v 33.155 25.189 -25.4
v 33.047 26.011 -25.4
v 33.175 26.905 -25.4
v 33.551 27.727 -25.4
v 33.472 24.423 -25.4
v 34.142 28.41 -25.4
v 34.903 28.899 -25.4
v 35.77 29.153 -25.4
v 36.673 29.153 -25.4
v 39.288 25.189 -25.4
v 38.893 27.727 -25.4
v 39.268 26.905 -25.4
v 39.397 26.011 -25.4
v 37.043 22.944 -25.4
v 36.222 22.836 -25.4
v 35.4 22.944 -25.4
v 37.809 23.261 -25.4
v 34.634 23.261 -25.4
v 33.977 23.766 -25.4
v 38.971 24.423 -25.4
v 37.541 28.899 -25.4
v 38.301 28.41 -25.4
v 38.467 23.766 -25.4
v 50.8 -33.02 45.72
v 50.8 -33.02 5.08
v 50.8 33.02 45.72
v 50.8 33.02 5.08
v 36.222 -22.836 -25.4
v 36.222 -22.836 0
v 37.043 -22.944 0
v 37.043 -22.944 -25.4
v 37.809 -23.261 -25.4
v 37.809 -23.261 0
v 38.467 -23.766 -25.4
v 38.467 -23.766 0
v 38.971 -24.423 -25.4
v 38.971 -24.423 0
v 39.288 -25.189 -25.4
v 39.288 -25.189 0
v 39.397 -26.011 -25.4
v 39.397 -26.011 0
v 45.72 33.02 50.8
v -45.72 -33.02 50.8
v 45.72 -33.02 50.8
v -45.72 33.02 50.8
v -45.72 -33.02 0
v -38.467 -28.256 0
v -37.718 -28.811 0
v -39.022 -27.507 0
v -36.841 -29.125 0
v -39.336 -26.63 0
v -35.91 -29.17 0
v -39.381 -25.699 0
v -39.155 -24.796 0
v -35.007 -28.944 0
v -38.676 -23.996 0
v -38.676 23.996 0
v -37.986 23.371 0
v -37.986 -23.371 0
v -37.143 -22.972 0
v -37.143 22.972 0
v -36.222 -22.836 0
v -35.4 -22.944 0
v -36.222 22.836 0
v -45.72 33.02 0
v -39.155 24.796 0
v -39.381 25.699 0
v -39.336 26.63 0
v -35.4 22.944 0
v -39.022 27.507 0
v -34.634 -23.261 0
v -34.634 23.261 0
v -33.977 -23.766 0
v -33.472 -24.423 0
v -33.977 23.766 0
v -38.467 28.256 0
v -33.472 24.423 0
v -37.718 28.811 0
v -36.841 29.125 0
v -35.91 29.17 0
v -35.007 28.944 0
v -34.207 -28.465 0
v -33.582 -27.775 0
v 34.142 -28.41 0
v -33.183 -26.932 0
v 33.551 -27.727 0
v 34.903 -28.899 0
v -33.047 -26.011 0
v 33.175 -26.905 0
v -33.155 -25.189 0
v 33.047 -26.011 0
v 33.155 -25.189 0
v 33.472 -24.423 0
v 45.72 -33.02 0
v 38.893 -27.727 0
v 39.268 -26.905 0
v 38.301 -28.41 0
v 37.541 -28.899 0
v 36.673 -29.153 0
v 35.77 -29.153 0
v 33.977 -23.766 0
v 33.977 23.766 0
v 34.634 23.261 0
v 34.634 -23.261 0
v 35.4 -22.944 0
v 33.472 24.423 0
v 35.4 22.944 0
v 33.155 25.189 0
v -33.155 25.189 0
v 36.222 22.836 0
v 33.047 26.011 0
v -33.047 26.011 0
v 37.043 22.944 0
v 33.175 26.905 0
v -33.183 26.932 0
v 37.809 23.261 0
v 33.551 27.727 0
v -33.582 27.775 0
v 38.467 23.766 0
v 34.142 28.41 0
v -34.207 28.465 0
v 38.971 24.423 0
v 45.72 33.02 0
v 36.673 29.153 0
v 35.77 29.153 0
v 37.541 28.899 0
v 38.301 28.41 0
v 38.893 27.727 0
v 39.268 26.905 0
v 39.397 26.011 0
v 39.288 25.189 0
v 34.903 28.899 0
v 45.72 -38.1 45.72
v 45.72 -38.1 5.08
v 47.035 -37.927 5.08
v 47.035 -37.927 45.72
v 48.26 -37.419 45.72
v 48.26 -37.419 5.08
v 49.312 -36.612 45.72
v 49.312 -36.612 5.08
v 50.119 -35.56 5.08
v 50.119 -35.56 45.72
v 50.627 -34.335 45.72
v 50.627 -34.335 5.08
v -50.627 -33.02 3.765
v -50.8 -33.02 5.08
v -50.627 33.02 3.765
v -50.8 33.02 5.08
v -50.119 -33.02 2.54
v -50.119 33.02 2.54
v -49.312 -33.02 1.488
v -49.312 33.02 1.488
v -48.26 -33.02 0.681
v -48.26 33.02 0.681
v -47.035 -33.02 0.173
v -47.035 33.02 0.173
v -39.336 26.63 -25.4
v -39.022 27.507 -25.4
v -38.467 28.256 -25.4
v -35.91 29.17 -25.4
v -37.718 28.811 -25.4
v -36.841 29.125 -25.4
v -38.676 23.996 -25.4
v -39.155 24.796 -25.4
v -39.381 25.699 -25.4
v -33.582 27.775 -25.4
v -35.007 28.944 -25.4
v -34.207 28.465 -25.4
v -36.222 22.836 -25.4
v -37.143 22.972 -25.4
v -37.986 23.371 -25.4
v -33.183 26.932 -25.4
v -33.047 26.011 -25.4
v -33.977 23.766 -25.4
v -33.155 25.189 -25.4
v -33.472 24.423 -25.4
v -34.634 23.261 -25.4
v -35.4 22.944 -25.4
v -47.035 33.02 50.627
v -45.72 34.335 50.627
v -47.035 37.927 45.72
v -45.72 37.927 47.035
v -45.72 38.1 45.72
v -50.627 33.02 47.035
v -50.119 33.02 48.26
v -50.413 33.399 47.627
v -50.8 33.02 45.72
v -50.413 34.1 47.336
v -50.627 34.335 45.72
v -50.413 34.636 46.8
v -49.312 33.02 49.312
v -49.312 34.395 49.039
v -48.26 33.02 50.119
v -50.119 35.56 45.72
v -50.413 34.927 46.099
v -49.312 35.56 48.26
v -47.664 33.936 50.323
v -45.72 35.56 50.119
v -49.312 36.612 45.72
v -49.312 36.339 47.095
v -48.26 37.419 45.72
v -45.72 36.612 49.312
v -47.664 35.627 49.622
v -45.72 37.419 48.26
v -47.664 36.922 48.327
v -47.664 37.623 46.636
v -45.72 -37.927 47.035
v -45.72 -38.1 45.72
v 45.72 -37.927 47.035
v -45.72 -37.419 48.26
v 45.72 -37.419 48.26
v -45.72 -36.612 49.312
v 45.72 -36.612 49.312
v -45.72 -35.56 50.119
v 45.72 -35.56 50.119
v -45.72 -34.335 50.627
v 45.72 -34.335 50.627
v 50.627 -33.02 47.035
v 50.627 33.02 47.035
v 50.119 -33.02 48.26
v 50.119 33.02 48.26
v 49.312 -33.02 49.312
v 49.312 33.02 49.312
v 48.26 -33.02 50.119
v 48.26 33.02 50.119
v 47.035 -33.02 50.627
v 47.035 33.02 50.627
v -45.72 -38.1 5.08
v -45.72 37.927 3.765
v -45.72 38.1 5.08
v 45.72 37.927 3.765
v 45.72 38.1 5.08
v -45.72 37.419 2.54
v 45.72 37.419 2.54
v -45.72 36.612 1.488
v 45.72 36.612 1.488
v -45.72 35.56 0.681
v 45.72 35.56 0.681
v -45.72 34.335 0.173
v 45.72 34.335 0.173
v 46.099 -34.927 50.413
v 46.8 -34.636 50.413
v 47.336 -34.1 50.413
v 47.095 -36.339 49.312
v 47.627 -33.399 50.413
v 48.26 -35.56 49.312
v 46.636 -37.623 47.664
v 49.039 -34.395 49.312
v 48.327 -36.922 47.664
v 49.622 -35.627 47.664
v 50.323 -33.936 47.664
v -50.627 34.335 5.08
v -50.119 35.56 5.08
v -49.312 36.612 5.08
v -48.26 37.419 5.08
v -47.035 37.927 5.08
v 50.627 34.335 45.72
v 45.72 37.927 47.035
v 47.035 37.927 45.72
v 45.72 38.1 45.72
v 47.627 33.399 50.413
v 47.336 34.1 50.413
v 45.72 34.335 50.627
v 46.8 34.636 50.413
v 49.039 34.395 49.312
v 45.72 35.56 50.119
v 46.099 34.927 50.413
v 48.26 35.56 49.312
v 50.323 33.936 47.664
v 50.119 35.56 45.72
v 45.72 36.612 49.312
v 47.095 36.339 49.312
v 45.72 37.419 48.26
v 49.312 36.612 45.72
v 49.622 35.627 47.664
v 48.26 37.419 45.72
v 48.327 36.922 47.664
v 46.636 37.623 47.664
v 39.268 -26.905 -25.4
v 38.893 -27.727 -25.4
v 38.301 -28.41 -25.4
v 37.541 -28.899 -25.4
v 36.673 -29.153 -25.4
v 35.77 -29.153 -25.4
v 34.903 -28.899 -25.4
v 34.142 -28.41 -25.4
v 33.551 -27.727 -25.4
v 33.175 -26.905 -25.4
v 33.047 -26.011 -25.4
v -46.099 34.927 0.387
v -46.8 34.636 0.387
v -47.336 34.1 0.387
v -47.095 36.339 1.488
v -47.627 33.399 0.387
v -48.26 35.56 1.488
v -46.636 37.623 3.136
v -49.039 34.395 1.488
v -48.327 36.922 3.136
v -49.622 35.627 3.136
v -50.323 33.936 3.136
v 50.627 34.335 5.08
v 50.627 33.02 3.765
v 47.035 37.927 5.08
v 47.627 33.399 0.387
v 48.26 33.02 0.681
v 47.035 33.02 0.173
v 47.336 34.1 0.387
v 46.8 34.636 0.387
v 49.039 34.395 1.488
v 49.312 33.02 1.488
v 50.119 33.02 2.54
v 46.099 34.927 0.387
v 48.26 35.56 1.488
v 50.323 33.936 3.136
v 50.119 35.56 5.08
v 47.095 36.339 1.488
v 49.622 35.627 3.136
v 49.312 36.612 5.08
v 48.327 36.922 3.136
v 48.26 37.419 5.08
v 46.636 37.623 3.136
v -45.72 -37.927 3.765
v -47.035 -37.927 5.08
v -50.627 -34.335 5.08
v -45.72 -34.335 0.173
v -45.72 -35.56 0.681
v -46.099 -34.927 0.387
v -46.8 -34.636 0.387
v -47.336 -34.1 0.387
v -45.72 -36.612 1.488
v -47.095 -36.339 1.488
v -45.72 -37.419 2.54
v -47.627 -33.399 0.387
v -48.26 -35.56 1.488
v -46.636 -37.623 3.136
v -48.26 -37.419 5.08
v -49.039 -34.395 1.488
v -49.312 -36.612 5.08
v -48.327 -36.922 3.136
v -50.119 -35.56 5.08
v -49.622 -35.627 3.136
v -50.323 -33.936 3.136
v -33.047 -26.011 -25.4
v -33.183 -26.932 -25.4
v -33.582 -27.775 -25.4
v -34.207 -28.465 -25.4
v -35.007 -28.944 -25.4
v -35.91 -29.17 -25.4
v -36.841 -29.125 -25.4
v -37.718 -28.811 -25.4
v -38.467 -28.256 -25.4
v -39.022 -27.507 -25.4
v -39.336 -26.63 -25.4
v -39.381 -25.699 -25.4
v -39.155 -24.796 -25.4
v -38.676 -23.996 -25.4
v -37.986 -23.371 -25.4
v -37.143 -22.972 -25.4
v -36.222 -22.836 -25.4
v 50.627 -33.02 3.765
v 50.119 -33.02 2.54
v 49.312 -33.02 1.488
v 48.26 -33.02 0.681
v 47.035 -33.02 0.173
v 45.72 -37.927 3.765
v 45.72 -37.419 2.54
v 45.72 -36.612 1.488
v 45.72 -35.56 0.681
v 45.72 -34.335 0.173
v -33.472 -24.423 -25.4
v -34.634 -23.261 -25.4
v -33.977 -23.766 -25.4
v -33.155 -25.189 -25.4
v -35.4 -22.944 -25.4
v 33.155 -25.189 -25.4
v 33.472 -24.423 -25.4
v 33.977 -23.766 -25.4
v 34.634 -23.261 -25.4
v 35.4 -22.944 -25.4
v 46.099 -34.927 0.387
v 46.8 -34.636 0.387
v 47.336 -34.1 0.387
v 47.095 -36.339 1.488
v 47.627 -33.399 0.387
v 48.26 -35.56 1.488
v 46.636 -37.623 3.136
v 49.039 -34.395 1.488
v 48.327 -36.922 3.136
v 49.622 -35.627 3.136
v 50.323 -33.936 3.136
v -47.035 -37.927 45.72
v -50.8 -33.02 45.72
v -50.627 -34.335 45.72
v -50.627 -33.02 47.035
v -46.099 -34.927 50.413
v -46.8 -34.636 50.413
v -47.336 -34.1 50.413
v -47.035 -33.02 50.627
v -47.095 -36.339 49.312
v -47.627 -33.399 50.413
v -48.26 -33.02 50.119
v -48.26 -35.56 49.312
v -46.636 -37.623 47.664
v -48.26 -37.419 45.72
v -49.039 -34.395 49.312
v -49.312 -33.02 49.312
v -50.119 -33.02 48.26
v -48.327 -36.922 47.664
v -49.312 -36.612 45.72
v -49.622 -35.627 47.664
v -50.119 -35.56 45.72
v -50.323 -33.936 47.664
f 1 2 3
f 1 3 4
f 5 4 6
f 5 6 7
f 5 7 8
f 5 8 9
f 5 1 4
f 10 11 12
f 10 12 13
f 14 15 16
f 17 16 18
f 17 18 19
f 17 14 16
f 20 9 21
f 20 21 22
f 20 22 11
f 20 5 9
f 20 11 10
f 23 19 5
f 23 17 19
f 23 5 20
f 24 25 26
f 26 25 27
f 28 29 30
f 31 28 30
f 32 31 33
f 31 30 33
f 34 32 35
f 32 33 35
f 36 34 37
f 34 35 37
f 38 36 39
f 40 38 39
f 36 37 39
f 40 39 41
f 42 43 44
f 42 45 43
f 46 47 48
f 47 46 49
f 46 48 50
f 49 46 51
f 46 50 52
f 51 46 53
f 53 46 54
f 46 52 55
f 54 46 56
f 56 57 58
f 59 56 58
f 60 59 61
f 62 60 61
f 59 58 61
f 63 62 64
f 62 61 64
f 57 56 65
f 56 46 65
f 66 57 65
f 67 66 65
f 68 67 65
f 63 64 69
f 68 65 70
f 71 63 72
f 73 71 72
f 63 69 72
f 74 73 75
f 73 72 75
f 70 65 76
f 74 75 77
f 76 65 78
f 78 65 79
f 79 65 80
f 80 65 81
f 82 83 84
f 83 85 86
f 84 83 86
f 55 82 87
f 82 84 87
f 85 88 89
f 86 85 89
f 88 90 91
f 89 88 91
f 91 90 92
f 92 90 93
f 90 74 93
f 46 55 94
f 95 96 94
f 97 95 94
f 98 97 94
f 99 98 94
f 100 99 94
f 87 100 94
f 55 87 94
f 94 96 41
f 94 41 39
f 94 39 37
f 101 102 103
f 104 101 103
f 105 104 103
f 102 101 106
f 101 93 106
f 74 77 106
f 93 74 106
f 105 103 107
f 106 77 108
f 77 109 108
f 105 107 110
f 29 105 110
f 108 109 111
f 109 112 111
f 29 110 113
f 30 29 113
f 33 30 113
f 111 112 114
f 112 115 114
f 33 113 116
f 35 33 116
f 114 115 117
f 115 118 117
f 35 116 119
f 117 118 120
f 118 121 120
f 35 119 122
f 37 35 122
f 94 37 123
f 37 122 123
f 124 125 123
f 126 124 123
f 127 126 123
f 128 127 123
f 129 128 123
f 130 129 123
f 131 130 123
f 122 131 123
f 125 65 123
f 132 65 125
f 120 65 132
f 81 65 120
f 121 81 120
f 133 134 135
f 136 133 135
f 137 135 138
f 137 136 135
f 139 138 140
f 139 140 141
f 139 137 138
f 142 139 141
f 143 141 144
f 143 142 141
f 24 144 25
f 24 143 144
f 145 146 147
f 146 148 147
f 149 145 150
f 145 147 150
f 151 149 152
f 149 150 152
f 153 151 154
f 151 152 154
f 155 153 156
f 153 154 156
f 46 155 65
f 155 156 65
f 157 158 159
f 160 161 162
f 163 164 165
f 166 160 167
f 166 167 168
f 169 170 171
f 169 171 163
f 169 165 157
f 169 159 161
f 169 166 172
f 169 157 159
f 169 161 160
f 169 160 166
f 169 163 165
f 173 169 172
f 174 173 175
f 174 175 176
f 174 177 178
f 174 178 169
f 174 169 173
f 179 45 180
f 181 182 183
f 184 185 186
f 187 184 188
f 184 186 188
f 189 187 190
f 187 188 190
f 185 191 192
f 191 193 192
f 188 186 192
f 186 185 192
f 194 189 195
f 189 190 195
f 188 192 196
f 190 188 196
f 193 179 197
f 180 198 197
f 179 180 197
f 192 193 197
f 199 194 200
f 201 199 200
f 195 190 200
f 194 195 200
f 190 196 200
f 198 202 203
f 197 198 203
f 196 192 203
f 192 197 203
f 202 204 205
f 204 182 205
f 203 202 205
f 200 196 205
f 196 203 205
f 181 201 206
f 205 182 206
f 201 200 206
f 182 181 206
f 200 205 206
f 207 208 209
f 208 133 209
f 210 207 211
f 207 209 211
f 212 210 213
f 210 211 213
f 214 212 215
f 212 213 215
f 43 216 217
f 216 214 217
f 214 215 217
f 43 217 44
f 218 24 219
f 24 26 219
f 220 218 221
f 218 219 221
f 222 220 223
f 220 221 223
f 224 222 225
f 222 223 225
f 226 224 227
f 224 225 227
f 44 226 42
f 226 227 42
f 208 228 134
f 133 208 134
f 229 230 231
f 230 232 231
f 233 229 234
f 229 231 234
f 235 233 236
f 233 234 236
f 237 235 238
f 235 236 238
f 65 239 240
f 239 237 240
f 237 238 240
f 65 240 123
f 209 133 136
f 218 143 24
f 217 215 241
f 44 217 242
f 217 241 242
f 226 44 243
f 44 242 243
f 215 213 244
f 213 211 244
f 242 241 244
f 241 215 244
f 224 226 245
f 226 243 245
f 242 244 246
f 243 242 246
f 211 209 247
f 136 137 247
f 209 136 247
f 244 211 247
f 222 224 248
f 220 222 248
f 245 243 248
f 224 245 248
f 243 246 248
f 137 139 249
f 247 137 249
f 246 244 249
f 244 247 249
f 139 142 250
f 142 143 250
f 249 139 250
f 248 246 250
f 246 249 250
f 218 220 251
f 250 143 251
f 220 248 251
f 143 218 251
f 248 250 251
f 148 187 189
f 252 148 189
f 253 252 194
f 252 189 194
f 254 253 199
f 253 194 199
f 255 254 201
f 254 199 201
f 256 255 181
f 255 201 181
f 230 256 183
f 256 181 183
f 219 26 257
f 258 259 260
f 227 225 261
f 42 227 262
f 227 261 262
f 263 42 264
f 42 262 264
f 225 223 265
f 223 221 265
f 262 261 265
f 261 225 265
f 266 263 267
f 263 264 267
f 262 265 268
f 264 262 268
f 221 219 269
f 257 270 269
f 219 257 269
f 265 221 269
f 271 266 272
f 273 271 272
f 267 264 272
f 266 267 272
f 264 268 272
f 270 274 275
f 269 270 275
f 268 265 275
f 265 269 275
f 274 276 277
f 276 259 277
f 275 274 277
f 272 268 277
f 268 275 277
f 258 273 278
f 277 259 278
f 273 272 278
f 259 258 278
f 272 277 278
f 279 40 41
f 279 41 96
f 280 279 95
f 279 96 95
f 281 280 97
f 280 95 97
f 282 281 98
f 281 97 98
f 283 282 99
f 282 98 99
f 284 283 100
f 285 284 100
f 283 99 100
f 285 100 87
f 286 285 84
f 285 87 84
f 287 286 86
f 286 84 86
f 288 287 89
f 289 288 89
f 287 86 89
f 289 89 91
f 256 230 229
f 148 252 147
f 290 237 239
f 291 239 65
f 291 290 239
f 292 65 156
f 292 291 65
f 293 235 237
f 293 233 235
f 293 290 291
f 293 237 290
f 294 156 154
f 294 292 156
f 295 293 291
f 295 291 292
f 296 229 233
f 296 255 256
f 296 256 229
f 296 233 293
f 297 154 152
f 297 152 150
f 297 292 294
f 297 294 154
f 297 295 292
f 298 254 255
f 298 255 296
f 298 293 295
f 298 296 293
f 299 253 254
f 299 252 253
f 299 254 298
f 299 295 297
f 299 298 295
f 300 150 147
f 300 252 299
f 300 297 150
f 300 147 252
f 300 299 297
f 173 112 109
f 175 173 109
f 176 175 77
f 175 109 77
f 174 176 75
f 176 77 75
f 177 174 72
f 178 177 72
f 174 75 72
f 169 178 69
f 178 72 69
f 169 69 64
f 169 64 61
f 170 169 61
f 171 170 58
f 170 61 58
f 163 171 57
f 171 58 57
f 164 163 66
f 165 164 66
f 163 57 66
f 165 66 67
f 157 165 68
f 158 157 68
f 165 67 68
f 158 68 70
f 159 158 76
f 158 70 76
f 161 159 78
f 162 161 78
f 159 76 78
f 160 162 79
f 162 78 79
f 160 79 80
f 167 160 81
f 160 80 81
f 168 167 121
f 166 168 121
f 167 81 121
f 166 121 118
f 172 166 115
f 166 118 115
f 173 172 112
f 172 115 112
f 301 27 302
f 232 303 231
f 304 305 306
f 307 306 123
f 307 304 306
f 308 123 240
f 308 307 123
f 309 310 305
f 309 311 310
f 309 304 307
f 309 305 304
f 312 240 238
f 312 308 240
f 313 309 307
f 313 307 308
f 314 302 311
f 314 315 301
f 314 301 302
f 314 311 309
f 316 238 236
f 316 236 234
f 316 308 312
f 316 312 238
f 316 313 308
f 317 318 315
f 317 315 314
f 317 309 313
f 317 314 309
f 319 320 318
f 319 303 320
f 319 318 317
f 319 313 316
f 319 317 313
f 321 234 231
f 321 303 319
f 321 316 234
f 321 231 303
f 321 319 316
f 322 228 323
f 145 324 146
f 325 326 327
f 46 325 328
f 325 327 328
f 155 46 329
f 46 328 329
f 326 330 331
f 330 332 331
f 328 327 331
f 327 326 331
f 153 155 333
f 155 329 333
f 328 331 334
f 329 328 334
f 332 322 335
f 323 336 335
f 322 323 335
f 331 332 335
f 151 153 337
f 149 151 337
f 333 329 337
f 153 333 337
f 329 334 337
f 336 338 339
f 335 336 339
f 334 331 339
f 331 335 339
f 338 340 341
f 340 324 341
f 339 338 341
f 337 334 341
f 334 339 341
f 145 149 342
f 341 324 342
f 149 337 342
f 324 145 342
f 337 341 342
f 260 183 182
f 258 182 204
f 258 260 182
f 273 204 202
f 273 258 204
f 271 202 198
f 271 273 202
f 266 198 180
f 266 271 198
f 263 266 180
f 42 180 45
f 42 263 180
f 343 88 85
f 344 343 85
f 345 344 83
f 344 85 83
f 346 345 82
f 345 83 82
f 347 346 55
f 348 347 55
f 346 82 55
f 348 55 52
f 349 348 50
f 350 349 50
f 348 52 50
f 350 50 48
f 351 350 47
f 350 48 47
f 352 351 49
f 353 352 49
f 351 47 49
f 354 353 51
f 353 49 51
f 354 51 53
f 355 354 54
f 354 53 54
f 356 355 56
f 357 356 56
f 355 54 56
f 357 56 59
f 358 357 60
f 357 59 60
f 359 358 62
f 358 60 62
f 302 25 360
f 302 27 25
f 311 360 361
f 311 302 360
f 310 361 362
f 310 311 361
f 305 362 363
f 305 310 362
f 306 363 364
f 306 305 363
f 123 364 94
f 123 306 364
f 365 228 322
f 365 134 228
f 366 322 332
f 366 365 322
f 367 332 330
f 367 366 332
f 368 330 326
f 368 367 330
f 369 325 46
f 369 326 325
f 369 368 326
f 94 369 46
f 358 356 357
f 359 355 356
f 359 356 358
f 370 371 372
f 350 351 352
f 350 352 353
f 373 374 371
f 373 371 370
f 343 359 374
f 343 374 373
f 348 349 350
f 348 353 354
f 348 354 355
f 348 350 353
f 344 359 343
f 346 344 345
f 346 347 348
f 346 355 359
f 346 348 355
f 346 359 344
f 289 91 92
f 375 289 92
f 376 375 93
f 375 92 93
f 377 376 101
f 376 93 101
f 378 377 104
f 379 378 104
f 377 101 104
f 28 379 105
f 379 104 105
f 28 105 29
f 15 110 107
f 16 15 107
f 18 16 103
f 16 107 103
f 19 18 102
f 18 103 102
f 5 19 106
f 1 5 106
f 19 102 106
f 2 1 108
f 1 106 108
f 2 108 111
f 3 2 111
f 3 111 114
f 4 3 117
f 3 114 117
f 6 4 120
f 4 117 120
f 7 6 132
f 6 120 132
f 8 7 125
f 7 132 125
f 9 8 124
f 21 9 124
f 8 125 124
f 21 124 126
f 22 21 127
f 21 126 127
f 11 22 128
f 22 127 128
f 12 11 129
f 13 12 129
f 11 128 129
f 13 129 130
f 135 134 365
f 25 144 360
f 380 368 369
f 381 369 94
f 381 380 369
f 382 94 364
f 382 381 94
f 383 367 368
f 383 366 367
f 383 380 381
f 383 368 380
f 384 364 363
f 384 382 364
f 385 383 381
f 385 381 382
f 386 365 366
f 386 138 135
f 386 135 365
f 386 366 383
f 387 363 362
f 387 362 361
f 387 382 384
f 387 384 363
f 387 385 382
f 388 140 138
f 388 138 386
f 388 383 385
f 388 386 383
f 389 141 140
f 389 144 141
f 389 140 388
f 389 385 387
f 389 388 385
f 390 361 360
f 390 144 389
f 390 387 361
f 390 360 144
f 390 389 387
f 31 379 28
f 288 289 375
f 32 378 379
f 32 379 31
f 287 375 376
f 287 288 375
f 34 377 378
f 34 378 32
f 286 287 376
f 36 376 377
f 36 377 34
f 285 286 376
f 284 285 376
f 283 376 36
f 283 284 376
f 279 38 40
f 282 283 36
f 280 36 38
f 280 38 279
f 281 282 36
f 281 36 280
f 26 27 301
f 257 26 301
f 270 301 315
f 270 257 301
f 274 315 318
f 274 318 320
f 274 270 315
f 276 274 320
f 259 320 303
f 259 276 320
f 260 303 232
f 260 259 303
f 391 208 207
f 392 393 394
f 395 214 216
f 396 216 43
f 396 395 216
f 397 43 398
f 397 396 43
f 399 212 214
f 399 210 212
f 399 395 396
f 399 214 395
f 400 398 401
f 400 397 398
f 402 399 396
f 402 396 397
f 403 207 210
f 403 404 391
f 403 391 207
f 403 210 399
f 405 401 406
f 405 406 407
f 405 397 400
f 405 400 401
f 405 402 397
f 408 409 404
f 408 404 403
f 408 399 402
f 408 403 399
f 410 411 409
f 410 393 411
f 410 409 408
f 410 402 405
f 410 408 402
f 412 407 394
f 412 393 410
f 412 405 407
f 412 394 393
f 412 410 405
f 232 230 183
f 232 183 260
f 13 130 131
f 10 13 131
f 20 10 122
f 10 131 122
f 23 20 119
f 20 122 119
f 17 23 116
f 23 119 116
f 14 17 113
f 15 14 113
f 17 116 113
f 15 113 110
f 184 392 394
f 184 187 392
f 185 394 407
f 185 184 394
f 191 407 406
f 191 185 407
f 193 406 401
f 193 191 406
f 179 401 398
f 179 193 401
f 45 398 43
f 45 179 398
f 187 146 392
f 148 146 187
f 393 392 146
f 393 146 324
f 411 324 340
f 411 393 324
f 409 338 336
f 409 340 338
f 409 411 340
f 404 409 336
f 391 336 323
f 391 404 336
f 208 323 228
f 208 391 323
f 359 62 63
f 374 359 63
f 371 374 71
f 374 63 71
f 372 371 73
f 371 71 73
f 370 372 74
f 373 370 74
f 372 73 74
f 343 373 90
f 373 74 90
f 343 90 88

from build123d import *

# Parameters (mm, degrees)
F0_W     = 101.6
F0_H     = 76.2
F1_DEPTH = 50.8
F2_R     = 5.08
F4_DEPTH = 25.4


with BuildPart() as f1:
    # F0 (on Top) → F1 (new body)
    with BuildSketch(Plane.XY):
        Rectangle(F0_W, F0_H)
    extrude(amount=F1_DEPTH)

    # F2
    f2_edges = [f1.edges().sort_by_distance(p)[0] for p in [
        (-50.8, -38.1, 25.4),
        (50.8, -38.1, 25.4),
        (0, -38.1, 0),
        (0, -38.1, 50.8),
        (50.8, 38.1, 25.4),
        (50.8, 0, 0),
        (50.8, 0, 50.8),
        (0, 38.1, 50.8),
        (-50.8, 0, 50.8),
        (-50.8, 38.1, 25.4),
        (0, 38.1, 0),
        (-50.8, 0, 0),
    ]]
    fillet(f2_edges, radius=F2_R)

    # F3 (on face) → F4 (join)
    with BuildSketch(Plane(origin=(0, 0, 0), x_dir=(1, 0, 0), z_dir=(0, 0, -1))):
        with BuildLine():
            Line((36.22162, -26.010673), (33.04662, -26.010673))
            ThreePointArc((33.04662, -26.010673), (36.22162, -29.185673), (39.39662, -26.010673))
            ThreePointArc((39.39662, -26.010673), (38.466684, -23.765609), (36.22162, -22.835673))
            Line((36.22162, -22.835673), (36.22162, -26.010673))
        make_face()
        with BuildLine():
            ThreePointArc((36.22162, -22.835673), (33.976556, -23.765609), (33.04662, -26.010673))
            Line((33.04662, -26.010673), (36.22162, -26.010673))
            Line((36.22162, -26.010673), (36.22162, -22.835673))
        make_face()
        with BuildLine():
            ThreePointArc((33.04662, 26.010673), (33.976556, 23.765609), (36.22162, 22.835673))
            Line((36.22162, 22.835673), (36.22162, 26.010673))
            Line((36.22162, 26.010673), (33.04662, 26.010673))
        make_face()
        with BuildLine():
            Line((36.22162, 26.010673), (36.22162, 22.835673))
            ThreePointArc((36.22162, 22.835673), (38.466684, 23.765609), (39.39662, 26.010673))
            ThreePointArc((39.39662, 26.010673), (36.22162, 29.185673), (33.04662, 26.010673))
            Line((33.04662, 26.010673), (36.22162, 26.010673))
        make_face()
        with BuildLine():
            Line((-36.22162, 26.010673), (-36.22162, 22.835673))
            ThreePointArc((-36.22162, 22.835673), (-33.976556, 23.765609), (-33.04662, 26.010673))
            Line((-33.04662, 26.010673), (-36.22162, 26.010673))
        make_face()
        with BuildLine():
            ThreePointArc((-33.04662, 26.010673), (-38.466684, 28.255738), (-36.22162, 22.835673))
            Line((-36.22162, 22.835673), (-36.22162, 26.010673))
            Line((-36.22162, 26.010673), (-33.04662, 26.010673))
        make_face()
        with BuildLine():
            Line((-36.22162, -26.010673), (-33.04662, -26.010673))
            ThreePointArc((-33.04662, -26.010673), (-33.976556, -23.765609), (-36.22162, -22.835673))
            Line((-36.22162, -22.835673), (-36.22162, -26.010673))
        make_face()
        with BuildLine():
            ThreePointArc((-36.22162, -22.835673), (-38.466684, -28.255738), (-33.04662, -26.010673))
            Line((-33.04662, -26.010673), (-36.22162, -26.010673))
            Line((-36.22162, -26.010673), (-36.22162, -22.835673))
        make_face()
    extrude(amount=F4_DEPTH)


solid = f1.part
